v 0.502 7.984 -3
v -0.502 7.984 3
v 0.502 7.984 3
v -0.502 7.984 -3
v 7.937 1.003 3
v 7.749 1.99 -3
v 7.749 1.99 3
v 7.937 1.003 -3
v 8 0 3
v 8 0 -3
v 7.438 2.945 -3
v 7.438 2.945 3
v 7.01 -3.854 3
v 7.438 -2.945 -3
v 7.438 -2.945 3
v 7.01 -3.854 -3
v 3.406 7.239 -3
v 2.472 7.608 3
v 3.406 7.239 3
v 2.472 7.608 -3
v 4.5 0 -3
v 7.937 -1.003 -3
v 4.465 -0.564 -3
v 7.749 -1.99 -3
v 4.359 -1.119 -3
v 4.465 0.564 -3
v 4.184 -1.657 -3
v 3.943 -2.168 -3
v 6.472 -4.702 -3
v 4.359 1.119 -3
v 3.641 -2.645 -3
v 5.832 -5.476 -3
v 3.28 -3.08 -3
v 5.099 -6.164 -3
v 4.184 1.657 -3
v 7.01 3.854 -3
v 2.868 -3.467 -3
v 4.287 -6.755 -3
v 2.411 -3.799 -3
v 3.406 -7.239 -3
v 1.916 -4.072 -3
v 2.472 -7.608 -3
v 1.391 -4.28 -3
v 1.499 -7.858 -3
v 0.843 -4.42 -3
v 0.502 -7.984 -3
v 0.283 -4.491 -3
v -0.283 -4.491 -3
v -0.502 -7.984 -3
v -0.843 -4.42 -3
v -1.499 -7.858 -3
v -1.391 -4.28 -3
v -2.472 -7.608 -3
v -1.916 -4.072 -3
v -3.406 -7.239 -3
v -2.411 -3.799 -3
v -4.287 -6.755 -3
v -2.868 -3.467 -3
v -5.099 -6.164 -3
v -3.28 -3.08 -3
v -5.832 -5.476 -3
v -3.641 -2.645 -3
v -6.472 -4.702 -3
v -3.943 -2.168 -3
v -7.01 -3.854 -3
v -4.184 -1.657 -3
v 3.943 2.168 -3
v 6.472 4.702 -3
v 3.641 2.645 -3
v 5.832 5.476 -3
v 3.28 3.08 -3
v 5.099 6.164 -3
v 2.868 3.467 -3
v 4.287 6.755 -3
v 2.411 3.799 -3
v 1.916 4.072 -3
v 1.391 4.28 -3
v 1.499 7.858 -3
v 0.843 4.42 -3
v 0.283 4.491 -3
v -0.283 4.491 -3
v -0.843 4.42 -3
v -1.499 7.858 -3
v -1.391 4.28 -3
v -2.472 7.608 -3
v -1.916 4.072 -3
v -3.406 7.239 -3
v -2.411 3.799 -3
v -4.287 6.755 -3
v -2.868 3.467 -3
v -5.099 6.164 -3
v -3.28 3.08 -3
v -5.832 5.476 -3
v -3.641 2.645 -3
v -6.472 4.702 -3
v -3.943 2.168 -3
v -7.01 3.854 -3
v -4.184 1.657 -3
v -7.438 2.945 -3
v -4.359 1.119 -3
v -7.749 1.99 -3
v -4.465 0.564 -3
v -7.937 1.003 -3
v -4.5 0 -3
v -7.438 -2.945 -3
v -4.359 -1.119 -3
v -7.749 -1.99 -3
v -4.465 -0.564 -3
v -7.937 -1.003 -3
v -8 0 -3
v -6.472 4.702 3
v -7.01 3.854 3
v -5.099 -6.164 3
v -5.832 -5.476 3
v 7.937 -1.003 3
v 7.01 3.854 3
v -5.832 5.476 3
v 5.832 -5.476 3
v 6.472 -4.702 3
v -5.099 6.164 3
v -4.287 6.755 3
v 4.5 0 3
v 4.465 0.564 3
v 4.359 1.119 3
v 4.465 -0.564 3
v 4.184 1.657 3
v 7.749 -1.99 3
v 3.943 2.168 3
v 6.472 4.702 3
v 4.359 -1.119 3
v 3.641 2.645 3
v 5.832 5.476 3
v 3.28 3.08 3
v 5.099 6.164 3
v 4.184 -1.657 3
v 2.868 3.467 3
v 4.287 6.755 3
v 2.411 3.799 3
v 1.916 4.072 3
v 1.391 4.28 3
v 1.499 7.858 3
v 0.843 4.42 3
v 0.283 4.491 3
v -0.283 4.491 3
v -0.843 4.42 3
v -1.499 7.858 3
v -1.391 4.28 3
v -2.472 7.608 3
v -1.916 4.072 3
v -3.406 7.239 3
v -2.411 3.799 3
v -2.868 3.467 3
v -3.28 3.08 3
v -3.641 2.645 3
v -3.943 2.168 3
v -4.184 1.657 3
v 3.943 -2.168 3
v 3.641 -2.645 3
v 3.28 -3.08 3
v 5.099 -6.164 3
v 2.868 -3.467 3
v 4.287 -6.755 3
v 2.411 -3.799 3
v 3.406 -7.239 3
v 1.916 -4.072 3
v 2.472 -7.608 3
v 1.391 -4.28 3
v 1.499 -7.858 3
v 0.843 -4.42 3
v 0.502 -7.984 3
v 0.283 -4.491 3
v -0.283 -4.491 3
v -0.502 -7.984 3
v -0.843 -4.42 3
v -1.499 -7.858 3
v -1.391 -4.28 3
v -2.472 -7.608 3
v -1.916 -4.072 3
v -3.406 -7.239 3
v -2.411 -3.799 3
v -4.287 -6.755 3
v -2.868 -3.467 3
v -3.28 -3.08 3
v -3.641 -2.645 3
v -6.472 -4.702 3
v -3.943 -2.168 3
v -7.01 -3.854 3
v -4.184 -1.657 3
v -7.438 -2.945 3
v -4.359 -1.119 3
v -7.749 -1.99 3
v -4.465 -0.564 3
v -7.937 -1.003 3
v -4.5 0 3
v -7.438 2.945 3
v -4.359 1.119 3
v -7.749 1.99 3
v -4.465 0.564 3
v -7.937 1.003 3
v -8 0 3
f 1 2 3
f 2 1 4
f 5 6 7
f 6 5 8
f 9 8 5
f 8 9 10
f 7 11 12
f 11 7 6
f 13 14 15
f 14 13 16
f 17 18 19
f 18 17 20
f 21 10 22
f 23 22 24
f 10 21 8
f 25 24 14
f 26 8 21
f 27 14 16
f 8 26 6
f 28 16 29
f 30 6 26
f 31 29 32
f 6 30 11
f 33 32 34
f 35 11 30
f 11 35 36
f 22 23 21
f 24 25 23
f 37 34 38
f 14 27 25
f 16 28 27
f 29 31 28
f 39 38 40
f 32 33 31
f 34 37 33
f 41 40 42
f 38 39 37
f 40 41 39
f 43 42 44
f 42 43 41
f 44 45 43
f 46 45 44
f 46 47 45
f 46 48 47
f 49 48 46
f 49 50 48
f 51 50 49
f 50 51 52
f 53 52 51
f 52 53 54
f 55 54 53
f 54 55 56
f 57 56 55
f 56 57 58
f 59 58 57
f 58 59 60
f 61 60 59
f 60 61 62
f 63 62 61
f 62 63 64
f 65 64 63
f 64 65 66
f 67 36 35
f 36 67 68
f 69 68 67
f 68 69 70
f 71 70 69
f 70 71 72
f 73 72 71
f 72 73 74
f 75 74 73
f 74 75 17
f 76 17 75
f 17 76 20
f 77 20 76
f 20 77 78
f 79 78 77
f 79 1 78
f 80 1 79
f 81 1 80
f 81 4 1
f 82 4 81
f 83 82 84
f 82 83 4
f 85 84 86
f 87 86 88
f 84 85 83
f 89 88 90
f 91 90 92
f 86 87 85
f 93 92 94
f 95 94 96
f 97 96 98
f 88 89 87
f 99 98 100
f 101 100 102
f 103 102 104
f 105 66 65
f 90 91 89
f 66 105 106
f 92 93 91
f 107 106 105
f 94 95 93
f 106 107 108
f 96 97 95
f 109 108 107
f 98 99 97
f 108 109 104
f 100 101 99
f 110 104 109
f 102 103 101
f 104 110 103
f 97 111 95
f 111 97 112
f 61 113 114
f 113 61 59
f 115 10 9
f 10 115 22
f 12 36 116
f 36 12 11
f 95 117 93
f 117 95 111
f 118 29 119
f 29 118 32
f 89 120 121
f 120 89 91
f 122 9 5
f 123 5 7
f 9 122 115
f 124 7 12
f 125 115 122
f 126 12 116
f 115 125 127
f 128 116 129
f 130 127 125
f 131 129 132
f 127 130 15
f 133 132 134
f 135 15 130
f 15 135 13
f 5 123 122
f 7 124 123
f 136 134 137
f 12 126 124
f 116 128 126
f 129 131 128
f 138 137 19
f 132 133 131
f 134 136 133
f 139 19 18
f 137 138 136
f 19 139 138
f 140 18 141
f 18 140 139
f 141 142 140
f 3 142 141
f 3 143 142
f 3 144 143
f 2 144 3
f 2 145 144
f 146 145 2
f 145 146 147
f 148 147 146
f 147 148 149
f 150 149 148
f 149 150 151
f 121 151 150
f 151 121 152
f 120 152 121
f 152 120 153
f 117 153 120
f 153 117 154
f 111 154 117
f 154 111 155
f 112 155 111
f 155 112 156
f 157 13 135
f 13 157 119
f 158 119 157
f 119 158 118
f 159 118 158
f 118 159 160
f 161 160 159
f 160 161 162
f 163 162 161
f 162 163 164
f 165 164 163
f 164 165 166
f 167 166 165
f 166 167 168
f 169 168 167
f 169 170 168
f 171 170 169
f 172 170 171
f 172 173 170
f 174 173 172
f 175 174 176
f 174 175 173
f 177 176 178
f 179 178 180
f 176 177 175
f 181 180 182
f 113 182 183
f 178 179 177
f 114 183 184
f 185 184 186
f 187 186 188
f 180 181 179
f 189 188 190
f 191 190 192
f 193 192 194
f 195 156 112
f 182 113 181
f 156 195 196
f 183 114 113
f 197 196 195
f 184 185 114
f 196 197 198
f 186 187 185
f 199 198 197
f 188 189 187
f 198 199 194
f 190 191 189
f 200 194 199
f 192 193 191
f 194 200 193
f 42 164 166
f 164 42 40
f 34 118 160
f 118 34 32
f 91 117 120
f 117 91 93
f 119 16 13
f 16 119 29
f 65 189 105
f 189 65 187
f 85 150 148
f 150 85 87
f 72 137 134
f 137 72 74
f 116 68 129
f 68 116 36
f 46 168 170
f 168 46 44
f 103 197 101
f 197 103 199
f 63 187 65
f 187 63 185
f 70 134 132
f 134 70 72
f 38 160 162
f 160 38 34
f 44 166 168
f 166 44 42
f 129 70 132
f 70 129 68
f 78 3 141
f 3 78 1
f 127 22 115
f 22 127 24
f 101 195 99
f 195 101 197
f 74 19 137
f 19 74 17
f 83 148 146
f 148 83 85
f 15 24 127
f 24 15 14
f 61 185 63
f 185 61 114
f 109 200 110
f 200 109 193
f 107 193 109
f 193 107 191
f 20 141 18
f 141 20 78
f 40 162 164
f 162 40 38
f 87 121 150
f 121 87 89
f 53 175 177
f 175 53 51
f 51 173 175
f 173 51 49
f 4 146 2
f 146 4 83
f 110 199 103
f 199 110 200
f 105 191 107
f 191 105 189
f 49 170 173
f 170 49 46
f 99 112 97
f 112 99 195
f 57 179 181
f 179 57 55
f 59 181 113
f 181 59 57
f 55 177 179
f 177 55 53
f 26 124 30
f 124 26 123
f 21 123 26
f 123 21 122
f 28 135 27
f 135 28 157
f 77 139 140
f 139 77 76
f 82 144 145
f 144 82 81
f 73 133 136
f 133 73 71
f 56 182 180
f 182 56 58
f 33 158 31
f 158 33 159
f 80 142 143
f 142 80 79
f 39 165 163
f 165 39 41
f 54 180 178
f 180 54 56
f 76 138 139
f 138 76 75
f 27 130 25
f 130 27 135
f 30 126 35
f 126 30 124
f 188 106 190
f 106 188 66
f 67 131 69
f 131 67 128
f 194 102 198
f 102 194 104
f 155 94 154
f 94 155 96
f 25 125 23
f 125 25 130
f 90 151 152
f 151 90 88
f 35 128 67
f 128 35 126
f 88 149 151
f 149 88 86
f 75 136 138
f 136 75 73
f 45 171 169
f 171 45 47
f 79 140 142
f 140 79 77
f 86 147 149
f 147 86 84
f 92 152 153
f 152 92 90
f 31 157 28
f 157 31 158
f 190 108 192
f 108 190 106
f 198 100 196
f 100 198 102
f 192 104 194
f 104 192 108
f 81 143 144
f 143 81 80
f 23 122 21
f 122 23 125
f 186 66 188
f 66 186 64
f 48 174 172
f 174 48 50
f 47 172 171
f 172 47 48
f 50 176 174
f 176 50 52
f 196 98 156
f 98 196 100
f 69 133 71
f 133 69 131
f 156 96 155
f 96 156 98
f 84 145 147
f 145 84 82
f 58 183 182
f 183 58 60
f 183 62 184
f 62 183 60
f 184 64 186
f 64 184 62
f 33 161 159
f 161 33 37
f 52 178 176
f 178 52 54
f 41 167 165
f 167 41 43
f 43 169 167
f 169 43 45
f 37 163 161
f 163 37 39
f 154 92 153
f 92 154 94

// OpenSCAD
$fn = 50;


difference() {
	union() {
		translate(v = [0, 0, -3.0000000000]) {
			cylinder(h = 6, r = 8.0000000000);
		}
	}
	union() {
		translate(v = [0, 0, -100.0000000000]) {
			cylinder(h = 200, r = 4.5000000000);
		}
	}
}
